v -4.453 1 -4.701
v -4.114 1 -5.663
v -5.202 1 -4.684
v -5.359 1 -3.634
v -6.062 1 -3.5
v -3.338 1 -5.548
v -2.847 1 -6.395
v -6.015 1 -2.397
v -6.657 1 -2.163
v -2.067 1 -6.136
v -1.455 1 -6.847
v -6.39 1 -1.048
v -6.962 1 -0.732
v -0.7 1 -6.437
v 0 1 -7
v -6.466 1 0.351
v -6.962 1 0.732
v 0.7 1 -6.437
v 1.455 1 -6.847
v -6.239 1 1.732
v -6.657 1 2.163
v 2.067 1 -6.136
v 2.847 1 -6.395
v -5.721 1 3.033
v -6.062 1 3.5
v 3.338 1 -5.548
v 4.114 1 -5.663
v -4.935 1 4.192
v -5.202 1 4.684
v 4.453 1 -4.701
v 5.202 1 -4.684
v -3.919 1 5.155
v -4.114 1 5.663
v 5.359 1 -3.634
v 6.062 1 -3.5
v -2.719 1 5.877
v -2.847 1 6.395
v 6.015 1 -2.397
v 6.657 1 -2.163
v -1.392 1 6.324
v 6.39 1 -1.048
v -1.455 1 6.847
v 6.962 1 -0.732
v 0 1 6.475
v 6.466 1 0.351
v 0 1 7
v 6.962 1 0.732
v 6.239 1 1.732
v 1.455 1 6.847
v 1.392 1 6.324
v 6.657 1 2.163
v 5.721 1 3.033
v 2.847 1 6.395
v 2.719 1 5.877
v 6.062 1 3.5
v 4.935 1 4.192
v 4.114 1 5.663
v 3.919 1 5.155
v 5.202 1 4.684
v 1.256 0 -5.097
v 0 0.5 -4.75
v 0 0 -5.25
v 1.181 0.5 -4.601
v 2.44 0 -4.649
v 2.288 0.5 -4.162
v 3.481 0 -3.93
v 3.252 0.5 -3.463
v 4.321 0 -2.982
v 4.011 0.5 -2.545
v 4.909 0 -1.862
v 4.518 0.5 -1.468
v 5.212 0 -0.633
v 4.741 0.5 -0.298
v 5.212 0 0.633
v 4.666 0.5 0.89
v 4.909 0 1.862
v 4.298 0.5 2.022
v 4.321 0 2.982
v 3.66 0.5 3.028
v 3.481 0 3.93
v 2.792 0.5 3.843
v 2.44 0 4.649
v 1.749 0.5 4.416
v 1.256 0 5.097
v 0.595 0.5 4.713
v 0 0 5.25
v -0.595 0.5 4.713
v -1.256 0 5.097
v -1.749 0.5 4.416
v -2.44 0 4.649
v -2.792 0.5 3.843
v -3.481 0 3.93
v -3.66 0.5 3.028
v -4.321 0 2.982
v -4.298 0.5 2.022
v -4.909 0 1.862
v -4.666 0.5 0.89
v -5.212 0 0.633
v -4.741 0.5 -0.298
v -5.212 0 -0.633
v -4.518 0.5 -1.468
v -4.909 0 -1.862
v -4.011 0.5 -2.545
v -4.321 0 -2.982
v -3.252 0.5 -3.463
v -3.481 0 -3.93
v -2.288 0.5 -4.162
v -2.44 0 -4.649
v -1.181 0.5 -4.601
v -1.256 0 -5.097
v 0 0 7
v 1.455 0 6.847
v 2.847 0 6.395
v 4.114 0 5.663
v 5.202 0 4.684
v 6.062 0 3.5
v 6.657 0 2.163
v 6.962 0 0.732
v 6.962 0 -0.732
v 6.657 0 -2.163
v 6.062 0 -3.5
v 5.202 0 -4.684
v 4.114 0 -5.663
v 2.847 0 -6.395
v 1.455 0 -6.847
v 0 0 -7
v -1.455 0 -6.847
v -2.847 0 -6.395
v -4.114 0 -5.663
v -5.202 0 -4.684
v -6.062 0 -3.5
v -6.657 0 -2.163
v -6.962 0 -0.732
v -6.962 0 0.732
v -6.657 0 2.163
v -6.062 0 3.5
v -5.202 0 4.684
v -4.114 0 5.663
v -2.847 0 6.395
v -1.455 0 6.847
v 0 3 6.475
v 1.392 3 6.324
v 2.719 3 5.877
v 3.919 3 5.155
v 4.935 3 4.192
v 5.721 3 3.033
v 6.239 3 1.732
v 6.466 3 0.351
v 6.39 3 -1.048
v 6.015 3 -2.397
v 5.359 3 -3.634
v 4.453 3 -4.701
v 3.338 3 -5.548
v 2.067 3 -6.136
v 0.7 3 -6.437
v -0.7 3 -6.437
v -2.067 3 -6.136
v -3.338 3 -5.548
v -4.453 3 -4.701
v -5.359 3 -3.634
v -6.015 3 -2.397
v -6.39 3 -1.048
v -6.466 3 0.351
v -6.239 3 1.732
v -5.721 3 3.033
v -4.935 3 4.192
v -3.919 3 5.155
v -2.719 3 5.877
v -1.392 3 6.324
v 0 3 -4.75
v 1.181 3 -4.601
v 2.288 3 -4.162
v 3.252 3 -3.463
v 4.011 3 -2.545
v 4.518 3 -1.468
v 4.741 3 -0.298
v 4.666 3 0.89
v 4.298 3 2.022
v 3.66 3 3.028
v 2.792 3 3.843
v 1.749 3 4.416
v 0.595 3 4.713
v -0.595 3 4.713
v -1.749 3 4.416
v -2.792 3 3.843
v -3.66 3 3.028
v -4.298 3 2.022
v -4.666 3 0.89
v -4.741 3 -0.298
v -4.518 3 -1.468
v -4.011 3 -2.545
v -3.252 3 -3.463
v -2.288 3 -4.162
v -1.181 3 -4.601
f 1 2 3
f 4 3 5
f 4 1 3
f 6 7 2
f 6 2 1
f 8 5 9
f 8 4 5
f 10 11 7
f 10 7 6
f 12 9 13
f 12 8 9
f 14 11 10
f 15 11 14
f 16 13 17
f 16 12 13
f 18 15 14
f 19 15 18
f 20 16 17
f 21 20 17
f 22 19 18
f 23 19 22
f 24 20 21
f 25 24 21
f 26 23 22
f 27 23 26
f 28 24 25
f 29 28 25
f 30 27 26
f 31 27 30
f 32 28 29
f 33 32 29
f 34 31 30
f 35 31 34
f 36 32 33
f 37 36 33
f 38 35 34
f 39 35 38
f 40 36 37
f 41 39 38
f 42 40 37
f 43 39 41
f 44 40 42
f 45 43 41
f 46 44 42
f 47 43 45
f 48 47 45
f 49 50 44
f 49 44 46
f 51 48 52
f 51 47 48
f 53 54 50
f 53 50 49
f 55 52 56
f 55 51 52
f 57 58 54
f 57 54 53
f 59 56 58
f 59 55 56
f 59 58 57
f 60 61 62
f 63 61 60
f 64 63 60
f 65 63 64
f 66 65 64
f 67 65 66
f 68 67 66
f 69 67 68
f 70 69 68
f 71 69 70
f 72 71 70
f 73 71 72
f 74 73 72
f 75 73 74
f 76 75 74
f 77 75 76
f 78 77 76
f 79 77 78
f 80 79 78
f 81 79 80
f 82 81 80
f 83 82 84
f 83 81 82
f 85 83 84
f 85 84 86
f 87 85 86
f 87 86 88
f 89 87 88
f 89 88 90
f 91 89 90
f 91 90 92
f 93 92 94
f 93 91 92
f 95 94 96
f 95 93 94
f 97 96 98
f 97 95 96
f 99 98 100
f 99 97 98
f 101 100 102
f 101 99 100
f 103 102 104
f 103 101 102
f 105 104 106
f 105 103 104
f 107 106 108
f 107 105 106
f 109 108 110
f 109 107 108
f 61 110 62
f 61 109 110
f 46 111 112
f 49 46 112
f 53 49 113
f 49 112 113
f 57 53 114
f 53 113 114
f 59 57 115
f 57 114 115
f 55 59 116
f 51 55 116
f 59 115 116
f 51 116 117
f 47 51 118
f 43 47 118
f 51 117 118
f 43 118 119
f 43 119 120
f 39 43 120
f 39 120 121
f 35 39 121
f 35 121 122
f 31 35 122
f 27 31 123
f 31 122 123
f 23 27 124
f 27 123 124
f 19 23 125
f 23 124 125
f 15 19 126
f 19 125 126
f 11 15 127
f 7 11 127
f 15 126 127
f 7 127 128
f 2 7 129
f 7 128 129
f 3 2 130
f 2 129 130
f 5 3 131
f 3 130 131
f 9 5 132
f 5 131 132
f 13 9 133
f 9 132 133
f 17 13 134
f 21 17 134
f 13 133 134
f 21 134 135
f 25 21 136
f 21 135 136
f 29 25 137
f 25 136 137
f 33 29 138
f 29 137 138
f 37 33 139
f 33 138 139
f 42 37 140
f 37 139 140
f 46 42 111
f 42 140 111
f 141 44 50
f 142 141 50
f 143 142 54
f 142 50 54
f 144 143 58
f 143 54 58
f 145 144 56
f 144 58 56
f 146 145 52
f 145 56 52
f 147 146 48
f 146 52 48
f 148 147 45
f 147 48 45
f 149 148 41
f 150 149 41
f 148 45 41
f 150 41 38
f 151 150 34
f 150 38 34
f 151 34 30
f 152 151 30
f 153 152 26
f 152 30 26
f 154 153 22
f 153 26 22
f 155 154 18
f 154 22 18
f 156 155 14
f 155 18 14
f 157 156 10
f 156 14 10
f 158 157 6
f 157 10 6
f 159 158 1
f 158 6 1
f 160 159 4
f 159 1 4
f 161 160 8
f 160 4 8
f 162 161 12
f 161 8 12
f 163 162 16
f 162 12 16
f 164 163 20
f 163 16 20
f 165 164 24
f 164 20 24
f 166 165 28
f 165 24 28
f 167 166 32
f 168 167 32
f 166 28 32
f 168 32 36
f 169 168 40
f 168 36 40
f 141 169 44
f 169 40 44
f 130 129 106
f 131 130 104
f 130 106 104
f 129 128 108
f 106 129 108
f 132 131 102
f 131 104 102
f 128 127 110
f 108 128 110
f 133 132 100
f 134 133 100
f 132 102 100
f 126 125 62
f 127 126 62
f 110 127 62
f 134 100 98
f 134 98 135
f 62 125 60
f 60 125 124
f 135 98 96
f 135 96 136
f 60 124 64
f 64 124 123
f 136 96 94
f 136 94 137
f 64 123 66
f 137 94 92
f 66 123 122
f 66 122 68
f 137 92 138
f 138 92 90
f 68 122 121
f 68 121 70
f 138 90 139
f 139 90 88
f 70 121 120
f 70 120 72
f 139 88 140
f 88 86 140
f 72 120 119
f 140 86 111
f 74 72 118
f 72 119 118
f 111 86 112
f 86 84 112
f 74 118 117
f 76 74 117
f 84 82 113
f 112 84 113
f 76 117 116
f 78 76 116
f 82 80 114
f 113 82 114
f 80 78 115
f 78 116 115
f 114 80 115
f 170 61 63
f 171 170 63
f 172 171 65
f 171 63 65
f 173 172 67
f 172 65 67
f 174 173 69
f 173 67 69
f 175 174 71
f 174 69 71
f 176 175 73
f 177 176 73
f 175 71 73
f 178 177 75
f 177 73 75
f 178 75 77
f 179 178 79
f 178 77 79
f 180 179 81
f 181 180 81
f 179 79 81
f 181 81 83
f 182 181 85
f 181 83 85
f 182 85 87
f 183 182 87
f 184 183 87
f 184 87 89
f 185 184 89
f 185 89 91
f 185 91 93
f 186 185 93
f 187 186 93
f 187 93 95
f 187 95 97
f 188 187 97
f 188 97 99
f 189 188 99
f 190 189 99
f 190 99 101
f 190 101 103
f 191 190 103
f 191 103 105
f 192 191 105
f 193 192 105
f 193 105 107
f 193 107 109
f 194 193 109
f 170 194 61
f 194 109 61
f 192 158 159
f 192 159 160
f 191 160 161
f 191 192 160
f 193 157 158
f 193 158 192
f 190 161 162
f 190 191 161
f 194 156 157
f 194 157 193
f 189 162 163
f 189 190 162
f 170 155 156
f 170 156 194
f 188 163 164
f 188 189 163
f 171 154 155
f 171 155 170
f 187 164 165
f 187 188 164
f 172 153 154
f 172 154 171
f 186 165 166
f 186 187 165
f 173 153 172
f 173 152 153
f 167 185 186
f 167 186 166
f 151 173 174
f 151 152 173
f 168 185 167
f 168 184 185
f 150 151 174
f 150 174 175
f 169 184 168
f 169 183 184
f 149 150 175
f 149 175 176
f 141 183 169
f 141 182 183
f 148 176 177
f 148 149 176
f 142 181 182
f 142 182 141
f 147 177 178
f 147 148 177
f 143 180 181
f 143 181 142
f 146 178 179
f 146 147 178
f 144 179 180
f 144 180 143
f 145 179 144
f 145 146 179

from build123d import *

# Parameters (mm, degrees)
SKETCH1_R           = 7
BOSS_EXTRUDE1_DEPTH = 1
SKETCH2_R           = 6.475
BOSS_EXTRUDE2_DEPTH = 2
SKETCH3_R           = 4.75
CUT_EXTRUDE1_DEPTH  = 11.344080433
CHAMFER1_SIZE       = 0.5


with BuildPart() as part:
    # Sketch1 → Boss-Extrude1 (new body)
    with BuildSketch(Plane(origin=(0, 0, 0), x_dir=(1, 0, 0), z_dir=(0, 1, 0))):
        with Locations(Location((0, 0, 0), (0, 0, 270))):
            Circle(SKETCH1_R)
    extrude(amount=BOSS_EXTRUDE1_DEPTH)

    # Sketch2 → Boss-Extrude2 (add)
    with BuildSketch(Plane(origin=(0, 1, 0), x_dir=(1, 0, 0), z_dir=(0, 1, 0))):
        with Locations(Location((0, 0, 0), (0, 0, 270))):
            Circle(SKETCH2_R)
    extrude(amount=BOSS_EXTRUDE2_DEPTH)

    # Sketch3 → Cut-Extrude1 (cut, through all)
    with BuildSketch(Plane.XZ):
        with Locations(Location((0, 0, 0), (0, 0, 270))):
            Circle(SKETCH3_R)
    extrude(amount=-CUT_EXTRUDE1_DEPTH, mode=Mode.SUBTRACT)

    # Chamfer1
    chamfer1_edges = [part.edges().sort_by_distance(p)[0] for p in [
        (0, 0, 4.75),
    ]]
    chamfer(chamfer1_edges, length=CHAMFER1_SIZE)


solid = part.part
